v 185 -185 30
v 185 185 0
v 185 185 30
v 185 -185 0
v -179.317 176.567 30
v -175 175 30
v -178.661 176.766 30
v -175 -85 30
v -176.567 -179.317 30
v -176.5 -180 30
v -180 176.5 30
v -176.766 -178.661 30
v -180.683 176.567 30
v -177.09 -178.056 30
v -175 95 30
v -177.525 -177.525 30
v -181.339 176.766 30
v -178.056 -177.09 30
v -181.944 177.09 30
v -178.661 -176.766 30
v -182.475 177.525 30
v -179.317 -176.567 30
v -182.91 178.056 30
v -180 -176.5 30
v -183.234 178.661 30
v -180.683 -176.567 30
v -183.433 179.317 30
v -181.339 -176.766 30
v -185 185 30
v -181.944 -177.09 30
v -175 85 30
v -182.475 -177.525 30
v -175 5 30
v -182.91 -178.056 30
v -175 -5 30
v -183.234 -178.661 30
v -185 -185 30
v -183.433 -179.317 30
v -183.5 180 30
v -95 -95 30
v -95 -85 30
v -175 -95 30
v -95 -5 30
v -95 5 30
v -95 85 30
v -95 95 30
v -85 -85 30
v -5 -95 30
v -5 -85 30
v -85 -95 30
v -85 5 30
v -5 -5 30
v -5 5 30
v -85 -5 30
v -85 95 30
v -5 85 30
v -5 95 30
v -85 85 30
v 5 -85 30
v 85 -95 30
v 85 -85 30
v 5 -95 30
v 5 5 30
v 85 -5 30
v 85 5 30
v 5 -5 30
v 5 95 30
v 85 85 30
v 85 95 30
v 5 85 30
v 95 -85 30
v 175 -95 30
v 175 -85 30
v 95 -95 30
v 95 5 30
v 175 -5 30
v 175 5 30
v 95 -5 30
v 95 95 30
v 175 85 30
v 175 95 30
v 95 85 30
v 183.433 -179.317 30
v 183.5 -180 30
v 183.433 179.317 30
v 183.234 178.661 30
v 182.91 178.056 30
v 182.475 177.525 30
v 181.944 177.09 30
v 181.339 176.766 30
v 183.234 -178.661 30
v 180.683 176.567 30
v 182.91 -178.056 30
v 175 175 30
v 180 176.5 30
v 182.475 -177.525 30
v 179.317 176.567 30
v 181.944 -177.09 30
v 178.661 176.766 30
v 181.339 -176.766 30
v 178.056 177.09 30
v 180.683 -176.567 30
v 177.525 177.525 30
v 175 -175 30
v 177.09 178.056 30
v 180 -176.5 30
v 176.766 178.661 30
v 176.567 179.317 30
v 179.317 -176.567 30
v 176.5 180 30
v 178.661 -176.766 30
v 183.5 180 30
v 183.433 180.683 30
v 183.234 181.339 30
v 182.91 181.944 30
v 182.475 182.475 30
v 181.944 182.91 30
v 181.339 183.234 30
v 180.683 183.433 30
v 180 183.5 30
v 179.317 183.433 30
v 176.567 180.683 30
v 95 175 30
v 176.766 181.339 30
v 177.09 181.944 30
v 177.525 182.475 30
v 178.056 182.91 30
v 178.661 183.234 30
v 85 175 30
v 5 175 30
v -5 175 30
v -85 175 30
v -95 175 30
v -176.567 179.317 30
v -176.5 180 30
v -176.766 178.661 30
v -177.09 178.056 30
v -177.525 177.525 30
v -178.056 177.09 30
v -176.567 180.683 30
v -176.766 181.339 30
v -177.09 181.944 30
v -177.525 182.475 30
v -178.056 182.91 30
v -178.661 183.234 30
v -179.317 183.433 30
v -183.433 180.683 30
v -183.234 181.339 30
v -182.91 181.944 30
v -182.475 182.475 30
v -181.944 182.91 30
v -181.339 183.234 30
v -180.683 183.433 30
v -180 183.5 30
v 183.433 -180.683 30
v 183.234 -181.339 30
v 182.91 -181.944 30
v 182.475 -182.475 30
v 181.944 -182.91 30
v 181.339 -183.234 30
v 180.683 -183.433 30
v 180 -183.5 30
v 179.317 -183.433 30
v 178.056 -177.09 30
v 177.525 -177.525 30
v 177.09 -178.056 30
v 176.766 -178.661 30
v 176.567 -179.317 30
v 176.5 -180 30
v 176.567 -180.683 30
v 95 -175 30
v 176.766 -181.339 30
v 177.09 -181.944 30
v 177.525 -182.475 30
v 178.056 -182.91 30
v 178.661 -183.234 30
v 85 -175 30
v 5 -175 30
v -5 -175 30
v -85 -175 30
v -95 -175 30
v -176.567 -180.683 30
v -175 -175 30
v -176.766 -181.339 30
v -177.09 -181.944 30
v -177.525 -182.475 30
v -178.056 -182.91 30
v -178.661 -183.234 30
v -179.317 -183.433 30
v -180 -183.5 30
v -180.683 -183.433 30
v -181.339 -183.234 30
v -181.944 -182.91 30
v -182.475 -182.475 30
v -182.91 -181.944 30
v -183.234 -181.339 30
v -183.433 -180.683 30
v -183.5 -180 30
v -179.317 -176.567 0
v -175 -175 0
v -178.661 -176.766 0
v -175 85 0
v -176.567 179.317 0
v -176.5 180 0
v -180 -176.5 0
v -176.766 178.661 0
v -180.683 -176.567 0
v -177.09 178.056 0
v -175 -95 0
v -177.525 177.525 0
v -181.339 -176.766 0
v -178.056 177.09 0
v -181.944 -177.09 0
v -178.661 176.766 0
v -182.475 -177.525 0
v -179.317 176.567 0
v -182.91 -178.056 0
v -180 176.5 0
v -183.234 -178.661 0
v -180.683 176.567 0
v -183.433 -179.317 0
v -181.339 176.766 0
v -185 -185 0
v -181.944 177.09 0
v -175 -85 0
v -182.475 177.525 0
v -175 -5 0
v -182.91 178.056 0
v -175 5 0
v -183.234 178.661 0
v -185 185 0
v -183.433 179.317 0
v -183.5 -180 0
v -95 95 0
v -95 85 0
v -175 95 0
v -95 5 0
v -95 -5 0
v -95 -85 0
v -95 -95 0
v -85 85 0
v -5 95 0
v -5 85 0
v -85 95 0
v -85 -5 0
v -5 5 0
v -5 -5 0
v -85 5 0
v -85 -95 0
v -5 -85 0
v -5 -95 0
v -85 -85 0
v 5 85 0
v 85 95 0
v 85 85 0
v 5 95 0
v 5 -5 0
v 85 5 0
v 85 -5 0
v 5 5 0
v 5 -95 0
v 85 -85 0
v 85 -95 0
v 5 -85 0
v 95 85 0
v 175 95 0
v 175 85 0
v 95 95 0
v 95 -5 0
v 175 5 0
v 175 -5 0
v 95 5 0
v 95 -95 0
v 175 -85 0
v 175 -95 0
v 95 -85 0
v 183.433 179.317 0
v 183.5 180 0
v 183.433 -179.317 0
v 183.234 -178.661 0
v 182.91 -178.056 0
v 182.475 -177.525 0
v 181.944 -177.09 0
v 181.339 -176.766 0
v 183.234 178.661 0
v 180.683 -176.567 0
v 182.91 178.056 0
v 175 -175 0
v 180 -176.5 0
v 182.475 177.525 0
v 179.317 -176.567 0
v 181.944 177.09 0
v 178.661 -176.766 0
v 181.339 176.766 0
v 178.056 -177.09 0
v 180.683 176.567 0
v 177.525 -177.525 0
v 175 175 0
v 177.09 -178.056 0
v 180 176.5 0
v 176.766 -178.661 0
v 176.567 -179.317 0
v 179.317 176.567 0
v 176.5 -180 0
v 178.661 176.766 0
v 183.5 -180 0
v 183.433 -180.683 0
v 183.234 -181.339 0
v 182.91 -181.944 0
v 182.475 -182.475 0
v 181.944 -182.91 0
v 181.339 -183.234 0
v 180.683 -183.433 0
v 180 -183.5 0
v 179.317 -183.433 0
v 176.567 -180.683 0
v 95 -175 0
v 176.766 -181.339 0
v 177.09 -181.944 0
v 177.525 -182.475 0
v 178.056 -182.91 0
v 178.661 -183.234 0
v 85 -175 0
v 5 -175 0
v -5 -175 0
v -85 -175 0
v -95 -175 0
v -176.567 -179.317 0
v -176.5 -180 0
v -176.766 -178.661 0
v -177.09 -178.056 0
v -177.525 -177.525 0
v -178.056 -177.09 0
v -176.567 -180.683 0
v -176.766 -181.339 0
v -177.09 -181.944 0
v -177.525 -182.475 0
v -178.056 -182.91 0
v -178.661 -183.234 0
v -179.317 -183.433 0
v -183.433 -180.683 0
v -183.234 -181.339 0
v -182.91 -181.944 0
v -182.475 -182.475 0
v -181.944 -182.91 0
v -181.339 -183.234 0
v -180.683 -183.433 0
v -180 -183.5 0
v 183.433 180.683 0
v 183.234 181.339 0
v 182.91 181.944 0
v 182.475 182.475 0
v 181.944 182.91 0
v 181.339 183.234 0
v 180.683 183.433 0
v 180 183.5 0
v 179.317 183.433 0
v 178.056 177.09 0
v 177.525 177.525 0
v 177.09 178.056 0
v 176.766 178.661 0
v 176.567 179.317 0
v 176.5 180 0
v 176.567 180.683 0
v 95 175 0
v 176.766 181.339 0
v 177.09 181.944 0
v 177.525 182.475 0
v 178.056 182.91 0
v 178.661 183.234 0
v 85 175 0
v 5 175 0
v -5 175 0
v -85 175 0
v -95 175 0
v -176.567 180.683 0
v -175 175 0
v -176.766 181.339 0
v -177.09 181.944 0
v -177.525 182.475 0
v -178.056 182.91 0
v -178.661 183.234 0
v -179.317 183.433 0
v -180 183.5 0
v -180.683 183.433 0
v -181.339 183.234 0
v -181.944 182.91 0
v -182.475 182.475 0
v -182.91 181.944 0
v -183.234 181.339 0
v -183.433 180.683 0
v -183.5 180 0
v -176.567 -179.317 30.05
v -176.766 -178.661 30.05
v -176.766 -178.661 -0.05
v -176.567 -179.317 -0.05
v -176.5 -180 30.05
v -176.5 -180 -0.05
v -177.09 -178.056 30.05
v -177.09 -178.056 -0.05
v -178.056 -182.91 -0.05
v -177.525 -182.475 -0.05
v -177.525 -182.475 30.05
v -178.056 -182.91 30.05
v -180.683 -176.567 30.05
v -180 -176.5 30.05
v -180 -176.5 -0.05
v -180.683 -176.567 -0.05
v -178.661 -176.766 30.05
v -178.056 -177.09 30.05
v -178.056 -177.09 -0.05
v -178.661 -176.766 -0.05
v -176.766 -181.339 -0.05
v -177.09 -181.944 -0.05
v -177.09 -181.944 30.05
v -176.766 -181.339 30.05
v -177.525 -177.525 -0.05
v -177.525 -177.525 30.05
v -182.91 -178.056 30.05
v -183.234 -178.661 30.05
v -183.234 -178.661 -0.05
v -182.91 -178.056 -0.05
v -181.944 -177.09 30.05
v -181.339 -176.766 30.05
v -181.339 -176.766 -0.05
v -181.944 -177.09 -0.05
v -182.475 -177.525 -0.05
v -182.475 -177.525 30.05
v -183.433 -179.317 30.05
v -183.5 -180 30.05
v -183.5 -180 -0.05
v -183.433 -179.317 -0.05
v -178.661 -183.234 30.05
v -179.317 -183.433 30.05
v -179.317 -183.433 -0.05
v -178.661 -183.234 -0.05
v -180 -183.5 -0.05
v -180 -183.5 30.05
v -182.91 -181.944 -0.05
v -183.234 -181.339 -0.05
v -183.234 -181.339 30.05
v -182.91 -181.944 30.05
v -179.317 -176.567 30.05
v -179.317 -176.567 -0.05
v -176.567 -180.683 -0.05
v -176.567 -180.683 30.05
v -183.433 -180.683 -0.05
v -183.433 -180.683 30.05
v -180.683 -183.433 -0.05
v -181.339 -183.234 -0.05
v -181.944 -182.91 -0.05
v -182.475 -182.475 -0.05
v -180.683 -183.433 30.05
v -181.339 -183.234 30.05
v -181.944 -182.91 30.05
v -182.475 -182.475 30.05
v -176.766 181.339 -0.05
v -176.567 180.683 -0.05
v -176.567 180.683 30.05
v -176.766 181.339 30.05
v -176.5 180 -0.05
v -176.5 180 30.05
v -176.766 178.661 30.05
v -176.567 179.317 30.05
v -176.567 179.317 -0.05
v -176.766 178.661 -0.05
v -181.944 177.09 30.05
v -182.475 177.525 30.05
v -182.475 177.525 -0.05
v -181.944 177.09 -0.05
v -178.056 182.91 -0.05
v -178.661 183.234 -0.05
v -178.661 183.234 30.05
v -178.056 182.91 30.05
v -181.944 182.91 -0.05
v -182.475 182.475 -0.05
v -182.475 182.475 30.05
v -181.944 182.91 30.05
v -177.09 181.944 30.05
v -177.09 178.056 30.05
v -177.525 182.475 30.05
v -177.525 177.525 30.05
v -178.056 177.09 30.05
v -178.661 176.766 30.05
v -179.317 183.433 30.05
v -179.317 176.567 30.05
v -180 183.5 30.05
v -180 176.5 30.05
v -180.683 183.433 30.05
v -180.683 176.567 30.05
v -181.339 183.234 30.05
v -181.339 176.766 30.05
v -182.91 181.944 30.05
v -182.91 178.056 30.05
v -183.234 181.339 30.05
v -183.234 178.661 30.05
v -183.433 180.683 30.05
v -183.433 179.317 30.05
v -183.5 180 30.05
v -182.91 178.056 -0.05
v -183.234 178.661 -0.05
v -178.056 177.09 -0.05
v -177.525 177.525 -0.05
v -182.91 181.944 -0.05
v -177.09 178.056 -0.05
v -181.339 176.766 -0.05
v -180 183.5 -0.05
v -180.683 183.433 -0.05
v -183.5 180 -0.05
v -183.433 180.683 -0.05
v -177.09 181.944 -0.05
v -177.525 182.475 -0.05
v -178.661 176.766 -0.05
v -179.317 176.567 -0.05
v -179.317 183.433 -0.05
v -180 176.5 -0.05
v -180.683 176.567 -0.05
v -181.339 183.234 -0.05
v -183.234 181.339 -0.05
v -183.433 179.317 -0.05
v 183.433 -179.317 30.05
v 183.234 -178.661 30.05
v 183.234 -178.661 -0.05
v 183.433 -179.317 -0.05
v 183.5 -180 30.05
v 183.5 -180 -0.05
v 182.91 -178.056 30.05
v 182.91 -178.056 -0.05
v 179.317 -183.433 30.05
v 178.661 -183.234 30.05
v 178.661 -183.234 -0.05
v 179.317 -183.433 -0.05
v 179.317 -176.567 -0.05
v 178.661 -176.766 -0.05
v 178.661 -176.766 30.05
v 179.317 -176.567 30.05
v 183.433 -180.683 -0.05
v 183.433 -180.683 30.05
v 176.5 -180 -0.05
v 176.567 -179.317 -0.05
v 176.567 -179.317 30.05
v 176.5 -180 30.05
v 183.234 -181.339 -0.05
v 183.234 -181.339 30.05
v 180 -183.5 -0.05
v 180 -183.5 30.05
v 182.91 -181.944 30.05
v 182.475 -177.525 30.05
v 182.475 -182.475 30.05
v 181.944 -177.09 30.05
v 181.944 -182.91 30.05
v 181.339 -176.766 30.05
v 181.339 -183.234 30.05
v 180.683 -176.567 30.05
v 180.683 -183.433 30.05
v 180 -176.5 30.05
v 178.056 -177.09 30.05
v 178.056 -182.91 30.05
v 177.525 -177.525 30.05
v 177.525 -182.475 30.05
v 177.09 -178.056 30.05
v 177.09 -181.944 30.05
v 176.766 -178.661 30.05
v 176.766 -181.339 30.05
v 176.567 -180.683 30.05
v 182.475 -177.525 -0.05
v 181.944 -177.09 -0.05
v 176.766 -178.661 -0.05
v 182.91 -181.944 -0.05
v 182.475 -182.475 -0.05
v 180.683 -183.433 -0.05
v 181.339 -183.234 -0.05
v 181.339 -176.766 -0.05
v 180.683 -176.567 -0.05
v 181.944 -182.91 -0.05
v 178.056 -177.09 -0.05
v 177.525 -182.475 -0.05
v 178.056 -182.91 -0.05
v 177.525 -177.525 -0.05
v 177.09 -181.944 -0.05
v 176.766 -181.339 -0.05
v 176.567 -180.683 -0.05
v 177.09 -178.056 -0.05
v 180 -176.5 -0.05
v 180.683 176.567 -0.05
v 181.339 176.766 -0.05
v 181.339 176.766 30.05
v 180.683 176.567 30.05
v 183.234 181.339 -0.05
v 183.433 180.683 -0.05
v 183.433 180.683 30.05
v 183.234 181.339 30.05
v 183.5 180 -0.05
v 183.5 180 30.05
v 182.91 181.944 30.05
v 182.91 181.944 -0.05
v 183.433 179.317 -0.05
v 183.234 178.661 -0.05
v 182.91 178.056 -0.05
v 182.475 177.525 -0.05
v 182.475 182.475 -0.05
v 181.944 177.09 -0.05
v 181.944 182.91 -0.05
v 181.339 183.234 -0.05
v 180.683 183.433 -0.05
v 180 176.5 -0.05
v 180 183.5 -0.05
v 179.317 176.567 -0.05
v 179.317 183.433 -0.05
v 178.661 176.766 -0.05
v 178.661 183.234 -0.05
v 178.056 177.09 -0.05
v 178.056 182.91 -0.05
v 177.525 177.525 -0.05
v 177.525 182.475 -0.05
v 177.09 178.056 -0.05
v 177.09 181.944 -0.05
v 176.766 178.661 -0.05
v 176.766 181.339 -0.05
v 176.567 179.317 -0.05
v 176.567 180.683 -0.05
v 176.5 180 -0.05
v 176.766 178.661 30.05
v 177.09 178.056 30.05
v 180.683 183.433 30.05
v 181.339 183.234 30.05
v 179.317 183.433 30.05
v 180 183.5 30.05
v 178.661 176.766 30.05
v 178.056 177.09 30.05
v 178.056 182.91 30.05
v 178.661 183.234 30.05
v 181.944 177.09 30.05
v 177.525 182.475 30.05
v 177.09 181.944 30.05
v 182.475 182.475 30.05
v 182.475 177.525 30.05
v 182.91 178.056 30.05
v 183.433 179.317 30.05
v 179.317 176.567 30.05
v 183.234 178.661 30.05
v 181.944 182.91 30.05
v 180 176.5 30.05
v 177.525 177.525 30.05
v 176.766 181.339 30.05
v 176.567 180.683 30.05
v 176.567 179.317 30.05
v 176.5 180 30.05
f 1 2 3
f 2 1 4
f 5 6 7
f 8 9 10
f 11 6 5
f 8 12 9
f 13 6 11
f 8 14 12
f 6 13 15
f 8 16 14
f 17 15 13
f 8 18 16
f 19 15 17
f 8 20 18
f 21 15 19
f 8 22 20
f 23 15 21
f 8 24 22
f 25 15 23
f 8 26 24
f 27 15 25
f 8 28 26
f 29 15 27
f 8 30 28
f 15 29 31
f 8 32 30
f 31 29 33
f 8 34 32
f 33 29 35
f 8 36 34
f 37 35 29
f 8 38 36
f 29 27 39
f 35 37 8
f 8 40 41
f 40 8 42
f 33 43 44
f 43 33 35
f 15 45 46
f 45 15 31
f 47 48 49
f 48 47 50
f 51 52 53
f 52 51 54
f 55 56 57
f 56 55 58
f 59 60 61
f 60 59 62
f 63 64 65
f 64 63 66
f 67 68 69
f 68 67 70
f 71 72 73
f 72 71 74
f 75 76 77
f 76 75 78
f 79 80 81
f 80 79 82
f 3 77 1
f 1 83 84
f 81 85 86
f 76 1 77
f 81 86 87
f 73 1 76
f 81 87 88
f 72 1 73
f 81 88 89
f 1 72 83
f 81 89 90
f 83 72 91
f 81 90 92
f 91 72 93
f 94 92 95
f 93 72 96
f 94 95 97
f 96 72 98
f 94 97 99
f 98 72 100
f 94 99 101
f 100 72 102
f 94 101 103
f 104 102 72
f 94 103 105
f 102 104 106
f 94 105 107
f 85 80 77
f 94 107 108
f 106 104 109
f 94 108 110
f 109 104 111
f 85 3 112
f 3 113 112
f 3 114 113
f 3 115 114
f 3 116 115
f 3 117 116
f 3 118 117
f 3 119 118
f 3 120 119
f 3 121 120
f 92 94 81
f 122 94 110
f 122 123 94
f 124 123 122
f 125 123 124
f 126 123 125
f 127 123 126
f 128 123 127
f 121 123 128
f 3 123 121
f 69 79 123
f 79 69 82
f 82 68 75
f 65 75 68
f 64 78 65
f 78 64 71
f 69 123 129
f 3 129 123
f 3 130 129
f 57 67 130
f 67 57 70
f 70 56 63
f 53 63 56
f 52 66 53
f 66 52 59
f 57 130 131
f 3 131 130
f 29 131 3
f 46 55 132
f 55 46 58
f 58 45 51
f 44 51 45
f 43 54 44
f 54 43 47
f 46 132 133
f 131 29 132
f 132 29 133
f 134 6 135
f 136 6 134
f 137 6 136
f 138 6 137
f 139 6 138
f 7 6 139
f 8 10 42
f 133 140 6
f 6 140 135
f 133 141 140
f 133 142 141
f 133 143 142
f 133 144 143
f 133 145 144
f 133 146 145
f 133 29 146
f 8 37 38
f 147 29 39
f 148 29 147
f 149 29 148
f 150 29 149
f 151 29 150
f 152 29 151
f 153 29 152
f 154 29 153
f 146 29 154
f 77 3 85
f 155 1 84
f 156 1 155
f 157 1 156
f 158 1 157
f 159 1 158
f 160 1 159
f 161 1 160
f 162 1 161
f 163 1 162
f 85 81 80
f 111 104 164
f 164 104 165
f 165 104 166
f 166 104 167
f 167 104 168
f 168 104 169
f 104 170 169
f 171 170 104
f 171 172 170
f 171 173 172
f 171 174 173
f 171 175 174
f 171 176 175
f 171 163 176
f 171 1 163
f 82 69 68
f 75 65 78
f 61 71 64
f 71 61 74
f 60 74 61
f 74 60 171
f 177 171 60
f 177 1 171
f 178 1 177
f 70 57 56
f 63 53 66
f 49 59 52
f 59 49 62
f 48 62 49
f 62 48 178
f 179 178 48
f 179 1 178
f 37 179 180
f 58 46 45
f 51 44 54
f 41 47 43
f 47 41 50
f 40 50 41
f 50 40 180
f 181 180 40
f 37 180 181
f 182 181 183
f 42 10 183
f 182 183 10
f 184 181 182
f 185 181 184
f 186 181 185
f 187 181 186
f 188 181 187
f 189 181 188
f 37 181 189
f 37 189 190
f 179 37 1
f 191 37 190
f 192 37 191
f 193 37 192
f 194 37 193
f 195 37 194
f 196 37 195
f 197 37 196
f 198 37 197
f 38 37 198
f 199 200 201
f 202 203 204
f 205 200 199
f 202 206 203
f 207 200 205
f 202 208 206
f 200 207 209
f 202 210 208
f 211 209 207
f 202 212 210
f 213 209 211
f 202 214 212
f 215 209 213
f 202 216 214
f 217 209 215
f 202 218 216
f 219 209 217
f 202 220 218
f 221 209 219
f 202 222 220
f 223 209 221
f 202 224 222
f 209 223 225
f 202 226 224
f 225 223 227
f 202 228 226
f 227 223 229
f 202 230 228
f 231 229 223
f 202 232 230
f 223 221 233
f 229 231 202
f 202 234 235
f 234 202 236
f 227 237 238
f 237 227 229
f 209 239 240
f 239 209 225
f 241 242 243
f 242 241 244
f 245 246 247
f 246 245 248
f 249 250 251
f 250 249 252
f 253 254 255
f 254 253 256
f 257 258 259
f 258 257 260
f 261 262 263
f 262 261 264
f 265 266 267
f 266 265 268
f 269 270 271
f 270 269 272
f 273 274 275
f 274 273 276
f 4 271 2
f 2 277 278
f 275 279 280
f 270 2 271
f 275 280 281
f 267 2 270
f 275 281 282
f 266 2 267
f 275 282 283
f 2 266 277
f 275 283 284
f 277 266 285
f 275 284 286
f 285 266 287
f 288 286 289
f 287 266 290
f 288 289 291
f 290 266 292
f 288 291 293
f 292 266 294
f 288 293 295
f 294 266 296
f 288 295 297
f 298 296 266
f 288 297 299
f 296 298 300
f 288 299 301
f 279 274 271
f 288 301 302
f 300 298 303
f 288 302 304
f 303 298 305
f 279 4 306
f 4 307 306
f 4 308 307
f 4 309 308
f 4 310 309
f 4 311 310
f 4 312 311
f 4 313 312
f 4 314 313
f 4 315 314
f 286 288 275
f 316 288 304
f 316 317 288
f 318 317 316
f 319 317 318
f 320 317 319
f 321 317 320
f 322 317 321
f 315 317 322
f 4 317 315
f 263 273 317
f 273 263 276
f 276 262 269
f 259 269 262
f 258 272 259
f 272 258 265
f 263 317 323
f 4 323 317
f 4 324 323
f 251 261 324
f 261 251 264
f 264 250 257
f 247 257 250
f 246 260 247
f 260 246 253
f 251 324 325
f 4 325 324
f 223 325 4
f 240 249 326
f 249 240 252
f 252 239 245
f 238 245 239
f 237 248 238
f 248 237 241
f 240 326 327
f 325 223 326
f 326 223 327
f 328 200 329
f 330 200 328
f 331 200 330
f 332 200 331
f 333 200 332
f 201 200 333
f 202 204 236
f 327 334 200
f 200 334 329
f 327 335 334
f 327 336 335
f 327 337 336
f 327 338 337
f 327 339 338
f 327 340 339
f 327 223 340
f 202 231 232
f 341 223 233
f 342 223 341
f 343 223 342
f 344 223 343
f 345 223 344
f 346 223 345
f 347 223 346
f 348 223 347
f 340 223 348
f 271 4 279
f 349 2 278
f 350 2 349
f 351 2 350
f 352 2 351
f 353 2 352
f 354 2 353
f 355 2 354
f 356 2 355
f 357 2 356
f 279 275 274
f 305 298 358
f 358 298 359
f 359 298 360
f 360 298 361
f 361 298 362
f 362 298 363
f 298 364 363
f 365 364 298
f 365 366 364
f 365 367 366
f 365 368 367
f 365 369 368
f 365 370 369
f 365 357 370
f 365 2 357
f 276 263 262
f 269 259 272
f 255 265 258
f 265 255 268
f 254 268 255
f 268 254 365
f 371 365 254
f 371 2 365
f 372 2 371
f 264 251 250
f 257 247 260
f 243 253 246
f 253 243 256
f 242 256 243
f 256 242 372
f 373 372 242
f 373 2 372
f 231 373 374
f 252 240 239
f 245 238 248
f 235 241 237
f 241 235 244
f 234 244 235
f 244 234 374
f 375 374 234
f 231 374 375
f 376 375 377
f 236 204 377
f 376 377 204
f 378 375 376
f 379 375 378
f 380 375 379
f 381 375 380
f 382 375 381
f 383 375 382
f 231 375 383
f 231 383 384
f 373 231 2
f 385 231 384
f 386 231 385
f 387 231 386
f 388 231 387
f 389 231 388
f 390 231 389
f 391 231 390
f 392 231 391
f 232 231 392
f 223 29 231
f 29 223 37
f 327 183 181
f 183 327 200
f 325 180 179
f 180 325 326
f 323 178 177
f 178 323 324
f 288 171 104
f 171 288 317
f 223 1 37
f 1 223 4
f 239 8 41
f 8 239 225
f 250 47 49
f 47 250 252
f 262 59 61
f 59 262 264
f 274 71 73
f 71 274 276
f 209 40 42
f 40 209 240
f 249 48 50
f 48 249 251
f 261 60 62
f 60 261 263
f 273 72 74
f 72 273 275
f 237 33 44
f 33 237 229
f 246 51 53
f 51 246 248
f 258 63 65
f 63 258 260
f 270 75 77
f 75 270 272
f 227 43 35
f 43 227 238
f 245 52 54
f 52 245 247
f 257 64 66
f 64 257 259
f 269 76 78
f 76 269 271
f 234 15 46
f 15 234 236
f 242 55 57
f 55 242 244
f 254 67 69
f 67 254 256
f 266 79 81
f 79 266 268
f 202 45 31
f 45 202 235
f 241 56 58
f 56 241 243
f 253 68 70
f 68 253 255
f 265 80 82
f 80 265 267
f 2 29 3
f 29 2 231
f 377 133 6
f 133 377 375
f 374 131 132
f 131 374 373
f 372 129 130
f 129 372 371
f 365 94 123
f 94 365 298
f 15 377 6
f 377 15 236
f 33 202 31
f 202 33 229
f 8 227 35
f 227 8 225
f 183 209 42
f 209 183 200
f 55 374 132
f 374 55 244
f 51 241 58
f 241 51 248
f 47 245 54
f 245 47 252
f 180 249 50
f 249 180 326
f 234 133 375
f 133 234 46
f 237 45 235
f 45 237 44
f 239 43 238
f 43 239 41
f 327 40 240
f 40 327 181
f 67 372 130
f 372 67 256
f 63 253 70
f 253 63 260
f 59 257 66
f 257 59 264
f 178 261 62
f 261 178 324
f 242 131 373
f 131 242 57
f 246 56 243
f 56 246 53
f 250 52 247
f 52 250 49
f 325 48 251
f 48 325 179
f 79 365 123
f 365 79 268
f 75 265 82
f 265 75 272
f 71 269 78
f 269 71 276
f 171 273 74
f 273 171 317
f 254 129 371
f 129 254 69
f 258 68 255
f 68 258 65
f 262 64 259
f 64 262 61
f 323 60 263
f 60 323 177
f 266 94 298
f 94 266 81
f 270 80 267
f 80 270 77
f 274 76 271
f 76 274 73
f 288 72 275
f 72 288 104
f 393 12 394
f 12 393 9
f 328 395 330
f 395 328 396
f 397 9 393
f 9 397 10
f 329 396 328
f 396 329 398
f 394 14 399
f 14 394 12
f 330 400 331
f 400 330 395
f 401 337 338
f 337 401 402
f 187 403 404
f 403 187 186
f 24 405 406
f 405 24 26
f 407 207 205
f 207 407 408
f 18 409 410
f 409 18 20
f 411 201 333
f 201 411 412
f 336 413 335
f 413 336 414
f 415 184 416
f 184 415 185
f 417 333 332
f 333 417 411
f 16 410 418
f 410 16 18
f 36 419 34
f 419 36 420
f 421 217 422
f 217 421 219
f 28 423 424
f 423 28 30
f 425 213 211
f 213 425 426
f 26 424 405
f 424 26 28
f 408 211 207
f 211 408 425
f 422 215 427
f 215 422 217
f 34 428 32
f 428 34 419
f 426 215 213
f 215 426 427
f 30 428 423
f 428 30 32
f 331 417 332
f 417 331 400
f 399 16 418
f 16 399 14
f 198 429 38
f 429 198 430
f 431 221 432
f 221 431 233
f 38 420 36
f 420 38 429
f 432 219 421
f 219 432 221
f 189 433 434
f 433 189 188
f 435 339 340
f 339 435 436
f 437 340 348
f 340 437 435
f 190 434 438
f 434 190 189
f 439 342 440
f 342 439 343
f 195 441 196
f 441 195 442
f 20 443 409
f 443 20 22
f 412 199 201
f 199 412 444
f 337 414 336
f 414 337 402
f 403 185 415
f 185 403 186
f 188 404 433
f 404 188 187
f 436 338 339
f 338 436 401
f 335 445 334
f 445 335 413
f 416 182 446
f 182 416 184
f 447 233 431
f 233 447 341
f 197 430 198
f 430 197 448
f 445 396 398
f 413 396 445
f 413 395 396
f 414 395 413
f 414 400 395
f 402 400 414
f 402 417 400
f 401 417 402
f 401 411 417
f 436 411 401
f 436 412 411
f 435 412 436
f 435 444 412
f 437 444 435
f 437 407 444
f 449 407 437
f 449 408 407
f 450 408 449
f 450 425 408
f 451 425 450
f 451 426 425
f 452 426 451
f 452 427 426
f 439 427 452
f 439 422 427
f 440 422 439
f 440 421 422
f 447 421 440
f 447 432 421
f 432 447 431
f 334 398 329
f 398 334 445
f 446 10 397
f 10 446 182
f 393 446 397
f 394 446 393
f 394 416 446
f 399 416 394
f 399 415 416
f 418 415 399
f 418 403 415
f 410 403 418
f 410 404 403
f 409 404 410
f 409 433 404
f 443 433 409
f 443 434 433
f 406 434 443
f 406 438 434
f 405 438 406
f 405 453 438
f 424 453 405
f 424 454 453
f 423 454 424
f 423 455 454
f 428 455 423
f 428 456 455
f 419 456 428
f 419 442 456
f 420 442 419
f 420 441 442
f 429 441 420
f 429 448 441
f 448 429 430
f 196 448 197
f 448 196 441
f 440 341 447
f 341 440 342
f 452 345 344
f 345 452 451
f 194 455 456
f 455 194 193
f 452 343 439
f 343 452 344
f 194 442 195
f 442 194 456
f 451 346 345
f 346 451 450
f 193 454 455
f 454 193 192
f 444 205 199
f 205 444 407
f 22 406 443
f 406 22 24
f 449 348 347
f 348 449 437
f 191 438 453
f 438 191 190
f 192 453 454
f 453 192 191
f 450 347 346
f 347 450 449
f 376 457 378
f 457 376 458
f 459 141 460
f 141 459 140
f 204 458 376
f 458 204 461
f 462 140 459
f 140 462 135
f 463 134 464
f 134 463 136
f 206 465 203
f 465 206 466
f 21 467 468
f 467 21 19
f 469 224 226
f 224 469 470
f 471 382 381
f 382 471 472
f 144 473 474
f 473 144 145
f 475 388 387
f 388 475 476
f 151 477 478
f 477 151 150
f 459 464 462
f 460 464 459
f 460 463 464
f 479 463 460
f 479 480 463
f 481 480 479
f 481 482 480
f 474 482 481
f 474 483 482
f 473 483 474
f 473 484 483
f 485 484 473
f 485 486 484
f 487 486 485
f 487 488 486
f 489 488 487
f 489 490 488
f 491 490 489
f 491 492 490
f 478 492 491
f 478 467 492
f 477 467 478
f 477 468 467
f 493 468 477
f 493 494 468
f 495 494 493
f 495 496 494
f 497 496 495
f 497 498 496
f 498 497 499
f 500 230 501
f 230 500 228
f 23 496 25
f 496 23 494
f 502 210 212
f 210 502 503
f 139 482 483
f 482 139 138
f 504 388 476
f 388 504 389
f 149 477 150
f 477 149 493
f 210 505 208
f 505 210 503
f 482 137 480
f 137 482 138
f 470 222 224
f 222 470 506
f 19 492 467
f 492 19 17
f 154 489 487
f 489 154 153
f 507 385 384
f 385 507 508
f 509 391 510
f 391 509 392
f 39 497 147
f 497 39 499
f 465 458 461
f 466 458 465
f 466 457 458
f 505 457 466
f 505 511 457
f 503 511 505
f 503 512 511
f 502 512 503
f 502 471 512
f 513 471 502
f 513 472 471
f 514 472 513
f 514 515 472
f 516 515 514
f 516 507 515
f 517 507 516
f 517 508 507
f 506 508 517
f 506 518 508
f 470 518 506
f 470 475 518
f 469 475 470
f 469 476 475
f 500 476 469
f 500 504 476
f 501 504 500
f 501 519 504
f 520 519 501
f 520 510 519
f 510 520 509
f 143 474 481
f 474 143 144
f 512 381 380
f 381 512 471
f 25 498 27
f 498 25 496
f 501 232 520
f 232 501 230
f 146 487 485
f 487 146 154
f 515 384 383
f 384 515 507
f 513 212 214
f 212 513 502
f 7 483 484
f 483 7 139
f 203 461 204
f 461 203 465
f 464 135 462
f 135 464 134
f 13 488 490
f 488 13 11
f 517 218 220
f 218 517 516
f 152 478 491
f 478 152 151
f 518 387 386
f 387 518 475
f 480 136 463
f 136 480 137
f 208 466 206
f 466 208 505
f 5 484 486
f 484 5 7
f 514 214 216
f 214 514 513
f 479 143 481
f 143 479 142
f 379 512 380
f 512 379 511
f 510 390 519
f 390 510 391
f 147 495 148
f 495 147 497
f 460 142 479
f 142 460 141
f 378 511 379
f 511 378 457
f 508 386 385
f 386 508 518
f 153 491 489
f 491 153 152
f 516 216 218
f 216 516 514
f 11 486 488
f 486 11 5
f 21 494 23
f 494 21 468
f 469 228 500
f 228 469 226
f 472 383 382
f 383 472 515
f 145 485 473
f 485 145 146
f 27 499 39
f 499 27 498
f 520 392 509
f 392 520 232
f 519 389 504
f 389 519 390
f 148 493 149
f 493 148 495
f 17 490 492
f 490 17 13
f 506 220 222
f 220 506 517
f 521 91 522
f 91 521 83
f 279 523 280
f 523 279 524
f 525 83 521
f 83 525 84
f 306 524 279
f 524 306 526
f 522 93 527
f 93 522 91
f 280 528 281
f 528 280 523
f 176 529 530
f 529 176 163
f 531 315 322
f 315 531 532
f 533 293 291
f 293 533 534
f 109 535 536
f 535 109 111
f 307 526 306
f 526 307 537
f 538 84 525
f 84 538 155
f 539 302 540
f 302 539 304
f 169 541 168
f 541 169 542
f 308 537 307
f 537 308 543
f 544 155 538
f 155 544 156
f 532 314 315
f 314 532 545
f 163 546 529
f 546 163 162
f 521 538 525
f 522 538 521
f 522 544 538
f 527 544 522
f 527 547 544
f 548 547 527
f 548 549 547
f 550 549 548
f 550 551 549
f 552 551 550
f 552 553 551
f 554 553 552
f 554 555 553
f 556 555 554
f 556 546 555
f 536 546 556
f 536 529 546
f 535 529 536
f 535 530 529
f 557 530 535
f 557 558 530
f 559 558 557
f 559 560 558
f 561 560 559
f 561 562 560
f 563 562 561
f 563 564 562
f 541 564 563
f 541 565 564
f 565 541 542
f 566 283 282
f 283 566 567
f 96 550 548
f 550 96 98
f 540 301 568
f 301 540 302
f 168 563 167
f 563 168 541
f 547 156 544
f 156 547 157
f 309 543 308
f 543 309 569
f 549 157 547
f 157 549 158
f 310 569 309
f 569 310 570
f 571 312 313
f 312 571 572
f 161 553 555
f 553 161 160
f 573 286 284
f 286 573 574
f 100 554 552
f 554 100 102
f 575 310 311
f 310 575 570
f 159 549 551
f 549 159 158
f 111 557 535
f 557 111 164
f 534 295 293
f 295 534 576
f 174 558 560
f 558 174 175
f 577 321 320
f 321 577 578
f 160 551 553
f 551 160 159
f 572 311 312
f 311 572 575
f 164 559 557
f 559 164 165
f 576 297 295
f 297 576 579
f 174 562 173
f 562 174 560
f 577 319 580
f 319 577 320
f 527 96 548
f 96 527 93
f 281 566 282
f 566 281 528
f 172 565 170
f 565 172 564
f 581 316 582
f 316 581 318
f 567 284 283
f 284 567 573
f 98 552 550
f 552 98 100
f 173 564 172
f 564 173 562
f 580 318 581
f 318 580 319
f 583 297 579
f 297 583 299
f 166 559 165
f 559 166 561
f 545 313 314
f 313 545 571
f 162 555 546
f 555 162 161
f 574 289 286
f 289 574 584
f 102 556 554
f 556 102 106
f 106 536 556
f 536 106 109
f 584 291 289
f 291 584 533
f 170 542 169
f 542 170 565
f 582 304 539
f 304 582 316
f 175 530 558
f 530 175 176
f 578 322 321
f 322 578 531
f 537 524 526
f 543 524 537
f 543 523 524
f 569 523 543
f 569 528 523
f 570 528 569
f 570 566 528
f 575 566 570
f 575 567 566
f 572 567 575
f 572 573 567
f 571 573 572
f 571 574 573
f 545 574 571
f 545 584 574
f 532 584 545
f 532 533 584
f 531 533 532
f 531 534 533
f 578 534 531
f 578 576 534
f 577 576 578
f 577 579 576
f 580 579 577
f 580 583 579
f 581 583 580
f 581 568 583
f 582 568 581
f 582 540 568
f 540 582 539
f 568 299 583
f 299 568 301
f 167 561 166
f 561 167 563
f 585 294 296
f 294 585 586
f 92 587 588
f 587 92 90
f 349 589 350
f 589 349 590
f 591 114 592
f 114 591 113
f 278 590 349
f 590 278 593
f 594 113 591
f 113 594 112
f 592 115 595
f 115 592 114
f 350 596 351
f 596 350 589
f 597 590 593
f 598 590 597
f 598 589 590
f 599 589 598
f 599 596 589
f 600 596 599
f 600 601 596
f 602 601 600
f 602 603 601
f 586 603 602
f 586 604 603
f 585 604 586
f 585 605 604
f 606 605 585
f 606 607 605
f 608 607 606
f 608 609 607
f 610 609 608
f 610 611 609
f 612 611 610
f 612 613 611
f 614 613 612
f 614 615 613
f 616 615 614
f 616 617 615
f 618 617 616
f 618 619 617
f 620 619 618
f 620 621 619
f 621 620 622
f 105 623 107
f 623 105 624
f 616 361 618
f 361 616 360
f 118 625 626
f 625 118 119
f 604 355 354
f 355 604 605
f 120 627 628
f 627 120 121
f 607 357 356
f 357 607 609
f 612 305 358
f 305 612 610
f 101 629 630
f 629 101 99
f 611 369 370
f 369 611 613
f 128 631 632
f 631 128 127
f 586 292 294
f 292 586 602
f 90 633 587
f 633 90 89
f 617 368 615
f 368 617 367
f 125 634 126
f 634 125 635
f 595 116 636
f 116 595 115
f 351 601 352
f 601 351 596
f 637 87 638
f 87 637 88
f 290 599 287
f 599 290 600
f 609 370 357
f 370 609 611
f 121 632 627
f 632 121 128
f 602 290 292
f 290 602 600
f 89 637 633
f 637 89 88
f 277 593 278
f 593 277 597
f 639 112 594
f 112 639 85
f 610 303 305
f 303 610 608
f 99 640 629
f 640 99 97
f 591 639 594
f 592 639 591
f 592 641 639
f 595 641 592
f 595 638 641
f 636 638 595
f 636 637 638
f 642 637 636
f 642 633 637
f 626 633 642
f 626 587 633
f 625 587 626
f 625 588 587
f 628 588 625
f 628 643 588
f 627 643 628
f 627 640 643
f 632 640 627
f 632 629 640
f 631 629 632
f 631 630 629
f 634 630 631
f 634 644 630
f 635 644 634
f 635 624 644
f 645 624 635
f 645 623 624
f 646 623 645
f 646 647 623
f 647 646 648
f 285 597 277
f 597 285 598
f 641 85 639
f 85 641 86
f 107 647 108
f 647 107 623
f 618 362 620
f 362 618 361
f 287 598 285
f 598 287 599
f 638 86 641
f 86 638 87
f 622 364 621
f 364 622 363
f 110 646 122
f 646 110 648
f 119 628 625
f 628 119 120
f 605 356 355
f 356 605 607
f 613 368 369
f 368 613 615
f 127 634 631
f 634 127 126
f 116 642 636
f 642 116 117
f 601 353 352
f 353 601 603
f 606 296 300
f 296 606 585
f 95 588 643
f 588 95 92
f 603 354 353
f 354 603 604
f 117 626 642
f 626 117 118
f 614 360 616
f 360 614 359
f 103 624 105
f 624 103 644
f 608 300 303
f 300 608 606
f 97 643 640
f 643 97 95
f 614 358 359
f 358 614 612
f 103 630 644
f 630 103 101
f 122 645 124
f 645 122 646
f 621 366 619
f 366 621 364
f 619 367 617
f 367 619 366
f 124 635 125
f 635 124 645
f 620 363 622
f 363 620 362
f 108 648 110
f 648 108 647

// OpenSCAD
// Part Name: Cage_Layer_14_H30mm
// This part represents a horizontal slice of the cage.
// It is designed to be 3D printed on its base.

// Parameters for the cage
bar_t = 10;
gap_xy = 80;
hole_d = 7;
cage_ext_xy = 370;

// Calculate bar center positions relative to the overall cage center
bar_centers_xy = [for (j = [0:4]) (-cage_ext_xy/2 + bar_t/2 + j * (bar_t + gap_xy))];

// Module to generate a single layer segment
module cage_layer_segment(height) {
    // Offset for printing on z=0 plane. The module itself is centered on XY=0, so this Z offset moves its base to Z=0.
    translate([0, 0, height/2]) {
        union() {
            // Horizontal bars (along X)
            for (y_center = bar_centers_xy) {
                translate([0, y_center, 0])
                cube([cage_ext_xy, bar_t, height], center = true);
            }

            // Vertical bars (along Y)
            for (x_center = bar_centers_xy) {
                translate([x_center, 0, 0])
                cube([bar_t, cage_ext_xy, height], center = true);
            }

            // Subtract holes for M6 rods at the 4 corners
            corner_offsets_xy = [bar_centers_xy[0], bar_centers_xy[4]];

            for (x_offset = corner_offsets_xy) {
                for (y_offset = corner_offsets_xy) {
                    // Hole through the center of the corner bar
                    translate([x_offset, y_offset, 0])
                    cylinder(h = height + 0.1, d = hole_d, center = true, $fn=32); // +0.1 for clean cut
                }
            }
        }
    }
}

// Render the segment
cage_layer_segment(30);
